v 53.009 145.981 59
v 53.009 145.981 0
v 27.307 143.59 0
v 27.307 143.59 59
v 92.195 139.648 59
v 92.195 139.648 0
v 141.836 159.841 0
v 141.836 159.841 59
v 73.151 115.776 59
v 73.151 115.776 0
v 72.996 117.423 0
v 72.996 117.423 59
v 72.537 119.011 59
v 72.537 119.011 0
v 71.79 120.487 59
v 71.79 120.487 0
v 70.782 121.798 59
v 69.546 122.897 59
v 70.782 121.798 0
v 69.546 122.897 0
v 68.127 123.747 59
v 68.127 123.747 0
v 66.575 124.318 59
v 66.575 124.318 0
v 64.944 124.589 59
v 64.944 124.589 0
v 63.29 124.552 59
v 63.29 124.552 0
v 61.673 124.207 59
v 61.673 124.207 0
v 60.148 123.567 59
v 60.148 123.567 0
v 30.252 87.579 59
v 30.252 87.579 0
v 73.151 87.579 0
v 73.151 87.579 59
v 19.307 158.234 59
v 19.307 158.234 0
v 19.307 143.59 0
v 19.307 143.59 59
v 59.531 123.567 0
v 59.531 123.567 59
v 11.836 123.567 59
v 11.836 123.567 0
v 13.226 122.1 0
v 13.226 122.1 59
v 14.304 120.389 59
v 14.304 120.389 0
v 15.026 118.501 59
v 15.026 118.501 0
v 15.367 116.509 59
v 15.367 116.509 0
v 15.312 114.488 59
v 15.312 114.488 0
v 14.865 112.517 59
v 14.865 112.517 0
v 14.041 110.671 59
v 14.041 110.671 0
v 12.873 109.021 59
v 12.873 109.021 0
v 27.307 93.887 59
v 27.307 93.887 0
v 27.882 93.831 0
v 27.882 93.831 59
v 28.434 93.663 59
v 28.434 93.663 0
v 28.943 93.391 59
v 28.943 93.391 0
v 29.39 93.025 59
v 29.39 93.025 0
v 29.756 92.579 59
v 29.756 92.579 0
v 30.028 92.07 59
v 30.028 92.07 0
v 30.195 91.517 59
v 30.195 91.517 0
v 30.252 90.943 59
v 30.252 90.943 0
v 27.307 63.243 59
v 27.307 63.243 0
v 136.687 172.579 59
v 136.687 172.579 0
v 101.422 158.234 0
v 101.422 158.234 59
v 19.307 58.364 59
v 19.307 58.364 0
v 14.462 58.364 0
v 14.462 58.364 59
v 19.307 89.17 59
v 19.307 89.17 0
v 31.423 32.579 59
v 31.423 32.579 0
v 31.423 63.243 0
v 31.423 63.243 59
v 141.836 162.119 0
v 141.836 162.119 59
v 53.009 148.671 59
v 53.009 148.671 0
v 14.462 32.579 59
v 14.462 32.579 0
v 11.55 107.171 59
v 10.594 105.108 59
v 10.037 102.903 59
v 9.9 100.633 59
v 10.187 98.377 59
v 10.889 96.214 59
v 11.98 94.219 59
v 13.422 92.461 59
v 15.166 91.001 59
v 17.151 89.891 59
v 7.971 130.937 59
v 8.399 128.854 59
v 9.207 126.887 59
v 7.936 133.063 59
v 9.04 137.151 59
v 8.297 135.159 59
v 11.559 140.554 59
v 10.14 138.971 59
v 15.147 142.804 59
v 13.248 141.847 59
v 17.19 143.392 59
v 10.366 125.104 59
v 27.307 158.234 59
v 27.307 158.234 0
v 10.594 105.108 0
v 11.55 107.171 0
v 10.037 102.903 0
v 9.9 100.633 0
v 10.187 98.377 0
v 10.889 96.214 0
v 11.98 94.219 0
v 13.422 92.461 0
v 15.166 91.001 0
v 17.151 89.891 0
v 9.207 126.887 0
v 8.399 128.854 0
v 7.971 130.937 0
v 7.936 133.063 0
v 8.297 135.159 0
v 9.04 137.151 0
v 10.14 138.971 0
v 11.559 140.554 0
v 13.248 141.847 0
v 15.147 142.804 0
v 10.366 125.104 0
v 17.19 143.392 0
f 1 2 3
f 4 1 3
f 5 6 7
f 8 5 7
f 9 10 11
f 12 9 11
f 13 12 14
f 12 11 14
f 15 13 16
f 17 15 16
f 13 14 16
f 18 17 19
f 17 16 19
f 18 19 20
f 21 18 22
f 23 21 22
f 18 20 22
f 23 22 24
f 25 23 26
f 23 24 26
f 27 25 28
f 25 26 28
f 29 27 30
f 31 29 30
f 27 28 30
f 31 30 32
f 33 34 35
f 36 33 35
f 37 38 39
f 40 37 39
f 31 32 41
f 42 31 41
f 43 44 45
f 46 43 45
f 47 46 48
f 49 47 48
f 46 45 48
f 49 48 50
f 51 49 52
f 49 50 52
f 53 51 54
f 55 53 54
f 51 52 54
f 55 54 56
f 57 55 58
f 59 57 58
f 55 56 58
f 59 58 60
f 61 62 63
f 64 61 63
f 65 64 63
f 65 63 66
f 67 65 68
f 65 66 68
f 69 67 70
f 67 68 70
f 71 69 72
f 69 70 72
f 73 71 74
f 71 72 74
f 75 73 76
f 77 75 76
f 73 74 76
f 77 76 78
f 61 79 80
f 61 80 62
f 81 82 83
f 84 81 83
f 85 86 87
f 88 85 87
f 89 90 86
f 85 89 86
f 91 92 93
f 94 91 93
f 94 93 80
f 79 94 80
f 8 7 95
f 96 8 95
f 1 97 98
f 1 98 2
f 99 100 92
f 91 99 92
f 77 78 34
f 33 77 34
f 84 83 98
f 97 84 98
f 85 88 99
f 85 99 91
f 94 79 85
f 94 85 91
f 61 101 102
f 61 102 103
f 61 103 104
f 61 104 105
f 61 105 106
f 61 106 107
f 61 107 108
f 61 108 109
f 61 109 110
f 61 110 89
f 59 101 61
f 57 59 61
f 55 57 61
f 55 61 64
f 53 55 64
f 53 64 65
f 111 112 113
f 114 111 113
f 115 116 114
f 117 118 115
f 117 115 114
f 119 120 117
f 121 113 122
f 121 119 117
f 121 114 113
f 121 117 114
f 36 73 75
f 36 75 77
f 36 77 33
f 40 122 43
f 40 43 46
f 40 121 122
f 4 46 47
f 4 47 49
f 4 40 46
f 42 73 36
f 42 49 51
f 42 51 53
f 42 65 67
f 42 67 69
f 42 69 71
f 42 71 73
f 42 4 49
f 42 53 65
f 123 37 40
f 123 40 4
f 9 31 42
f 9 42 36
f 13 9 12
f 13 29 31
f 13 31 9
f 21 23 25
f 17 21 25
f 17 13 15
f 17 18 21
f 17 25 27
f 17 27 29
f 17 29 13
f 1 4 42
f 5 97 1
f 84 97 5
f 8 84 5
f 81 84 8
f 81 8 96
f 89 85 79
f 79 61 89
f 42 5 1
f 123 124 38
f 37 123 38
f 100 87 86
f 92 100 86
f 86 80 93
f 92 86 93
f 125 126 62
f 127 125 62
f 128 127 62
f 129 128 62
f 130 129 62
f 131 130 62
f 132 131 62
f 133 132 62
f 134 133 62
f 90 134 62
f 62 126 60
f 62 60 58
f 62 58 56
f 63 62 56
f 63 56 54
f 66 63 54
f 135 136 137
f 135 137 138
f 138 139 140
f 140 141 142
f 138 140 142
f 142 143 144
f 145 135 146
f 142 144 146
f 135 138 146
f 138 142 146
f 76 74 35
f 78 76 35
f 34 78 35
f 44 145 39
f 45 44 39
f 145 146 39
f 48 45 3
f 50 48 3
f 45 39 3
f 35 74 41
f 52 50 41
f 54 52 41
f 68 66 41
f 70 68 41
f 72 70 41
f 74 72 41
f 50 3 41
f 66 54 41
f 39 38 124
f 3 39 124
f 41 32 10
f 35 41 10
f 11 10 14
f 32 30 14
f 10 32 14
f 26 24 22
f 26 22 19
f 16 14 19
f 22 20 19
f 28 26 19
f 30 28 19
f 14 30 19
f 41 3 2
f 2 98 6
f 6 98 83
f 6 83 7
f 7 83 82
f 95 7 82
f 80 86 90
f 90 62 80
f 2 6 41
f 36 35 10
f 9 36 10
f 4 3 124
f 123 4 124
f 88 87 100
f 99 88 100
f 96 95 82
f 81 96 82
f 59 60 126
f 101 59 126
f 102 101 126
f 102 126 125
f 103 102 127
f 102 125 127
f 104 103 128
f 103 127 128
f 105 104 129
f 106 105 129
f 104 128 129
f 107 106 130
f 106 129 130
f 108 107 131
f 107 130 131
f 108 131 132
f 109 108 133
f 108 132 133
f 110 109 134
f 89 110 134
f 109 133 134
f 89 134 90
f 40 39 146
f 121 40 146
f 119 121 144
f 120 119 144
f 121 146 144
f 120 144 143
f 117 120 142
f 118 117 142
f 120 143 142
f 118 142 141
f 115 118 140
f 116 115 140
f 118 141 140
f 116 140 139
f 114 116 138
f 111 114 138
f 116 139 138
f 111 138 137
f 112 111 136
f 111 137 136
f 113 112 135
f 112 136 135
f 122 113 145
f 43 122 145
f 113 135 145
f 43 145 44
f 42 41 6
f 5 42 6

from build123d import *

# Parameters (mm, degrees)
BOSS_EXTRUDE1_DEPTH = 59


with BuildPart() as part:
    # Sketch1 → Boss-Extrude1 (new body)
    with BuildSketch(Plane.XY):
        with BuildLine():
            Line((141.836213574, 162.11895664), (136.686788287, 172.578726755))
            Line((136.686788287, 172.578726755), (101.422420471, 158.233899169))
            Line((101.422420471, 158.233899169), (53.008627367, 148.670680778))
            Line((53.008627367, 148.670680778), (53.008627367, 145.981025606))
            Line((53.008627367, 145.981025606), (27.307477942, 143.590221008))
            Line((27.307477942, 143.590221008), (27.307477942, 158.233899169))
            Line((27.307477942, 158.233899169), (19.307477942, 158.233899169))
            Line((19.307477942, 158.233899169), (19.307477942, 143.590221008))
            ThreePointArc((19.307477942, 143.590221008), (8.621741422, 136.172049269), (11.836213574, 123.567232502))
            ThreePointArc((11.836213574, 123.567232502), (15.367024557, 116.508815615), (12.8726305, 109.02110078))
            ThreePointArc((12.8726305, 109.02110078), (10.487522097, 97.279293257), (19.307477942, 89.169597523))
            Line((19.307477942, 89.169597523), (19.307477942, 58.363836225))
            Line((19.307477942, 58.363836225), (14.461757095, 58.363836225))
            Line((14.461757095, 58.363836225), (14.461757095, 32.578726755))
            Line((14.461757095, 32.578726755), (31.423101088, 32.578726755))
            Line((31.423101088, 32.578726755), (31.423101088, 63.242577829))
            Line((31.423101088, 63.242577829), (27.307477942, 63.242577829))
            Line((27.307477942, 63.242577829), (27.307477942, 93.887357851))
            ThreePointArc((27.307477942, 93.887357851), (29.389559507, 93.024931429), (30.251985929, 90.942849864))
            Line((30.251985929, 90.942849864), (30.251985929, 87.578726755))
            Line((30.251985929, 87.578726755), (73.151157521, 87.578726755))
            Line((73.151157521, 87.578726755), (73.151157521, 91.578726755))
            Line((73.151157521, 91.578726755), (73.151157521, 115.775958178))
            ThreePointArc((73.151157521, 115.775958178), (68.856721822, 123.355383827), (60.147818832, 123.567232502))
            Line((60.147818832, 123.567232502), (59.530992057, 123.567232502))
            Line((59.530992057, 123.567232502), (92.194583693, 139.647769923))
            Line((92.194583693, 139.647769923), (141.836213574, 159.840975298))
            Line((141.836213574, 159.840975298), (141.836213574, 162.11895664))
        make_face()
    extrude(amount=BOSS_EXTRUDE1_DEPTH)


solid = part.part
